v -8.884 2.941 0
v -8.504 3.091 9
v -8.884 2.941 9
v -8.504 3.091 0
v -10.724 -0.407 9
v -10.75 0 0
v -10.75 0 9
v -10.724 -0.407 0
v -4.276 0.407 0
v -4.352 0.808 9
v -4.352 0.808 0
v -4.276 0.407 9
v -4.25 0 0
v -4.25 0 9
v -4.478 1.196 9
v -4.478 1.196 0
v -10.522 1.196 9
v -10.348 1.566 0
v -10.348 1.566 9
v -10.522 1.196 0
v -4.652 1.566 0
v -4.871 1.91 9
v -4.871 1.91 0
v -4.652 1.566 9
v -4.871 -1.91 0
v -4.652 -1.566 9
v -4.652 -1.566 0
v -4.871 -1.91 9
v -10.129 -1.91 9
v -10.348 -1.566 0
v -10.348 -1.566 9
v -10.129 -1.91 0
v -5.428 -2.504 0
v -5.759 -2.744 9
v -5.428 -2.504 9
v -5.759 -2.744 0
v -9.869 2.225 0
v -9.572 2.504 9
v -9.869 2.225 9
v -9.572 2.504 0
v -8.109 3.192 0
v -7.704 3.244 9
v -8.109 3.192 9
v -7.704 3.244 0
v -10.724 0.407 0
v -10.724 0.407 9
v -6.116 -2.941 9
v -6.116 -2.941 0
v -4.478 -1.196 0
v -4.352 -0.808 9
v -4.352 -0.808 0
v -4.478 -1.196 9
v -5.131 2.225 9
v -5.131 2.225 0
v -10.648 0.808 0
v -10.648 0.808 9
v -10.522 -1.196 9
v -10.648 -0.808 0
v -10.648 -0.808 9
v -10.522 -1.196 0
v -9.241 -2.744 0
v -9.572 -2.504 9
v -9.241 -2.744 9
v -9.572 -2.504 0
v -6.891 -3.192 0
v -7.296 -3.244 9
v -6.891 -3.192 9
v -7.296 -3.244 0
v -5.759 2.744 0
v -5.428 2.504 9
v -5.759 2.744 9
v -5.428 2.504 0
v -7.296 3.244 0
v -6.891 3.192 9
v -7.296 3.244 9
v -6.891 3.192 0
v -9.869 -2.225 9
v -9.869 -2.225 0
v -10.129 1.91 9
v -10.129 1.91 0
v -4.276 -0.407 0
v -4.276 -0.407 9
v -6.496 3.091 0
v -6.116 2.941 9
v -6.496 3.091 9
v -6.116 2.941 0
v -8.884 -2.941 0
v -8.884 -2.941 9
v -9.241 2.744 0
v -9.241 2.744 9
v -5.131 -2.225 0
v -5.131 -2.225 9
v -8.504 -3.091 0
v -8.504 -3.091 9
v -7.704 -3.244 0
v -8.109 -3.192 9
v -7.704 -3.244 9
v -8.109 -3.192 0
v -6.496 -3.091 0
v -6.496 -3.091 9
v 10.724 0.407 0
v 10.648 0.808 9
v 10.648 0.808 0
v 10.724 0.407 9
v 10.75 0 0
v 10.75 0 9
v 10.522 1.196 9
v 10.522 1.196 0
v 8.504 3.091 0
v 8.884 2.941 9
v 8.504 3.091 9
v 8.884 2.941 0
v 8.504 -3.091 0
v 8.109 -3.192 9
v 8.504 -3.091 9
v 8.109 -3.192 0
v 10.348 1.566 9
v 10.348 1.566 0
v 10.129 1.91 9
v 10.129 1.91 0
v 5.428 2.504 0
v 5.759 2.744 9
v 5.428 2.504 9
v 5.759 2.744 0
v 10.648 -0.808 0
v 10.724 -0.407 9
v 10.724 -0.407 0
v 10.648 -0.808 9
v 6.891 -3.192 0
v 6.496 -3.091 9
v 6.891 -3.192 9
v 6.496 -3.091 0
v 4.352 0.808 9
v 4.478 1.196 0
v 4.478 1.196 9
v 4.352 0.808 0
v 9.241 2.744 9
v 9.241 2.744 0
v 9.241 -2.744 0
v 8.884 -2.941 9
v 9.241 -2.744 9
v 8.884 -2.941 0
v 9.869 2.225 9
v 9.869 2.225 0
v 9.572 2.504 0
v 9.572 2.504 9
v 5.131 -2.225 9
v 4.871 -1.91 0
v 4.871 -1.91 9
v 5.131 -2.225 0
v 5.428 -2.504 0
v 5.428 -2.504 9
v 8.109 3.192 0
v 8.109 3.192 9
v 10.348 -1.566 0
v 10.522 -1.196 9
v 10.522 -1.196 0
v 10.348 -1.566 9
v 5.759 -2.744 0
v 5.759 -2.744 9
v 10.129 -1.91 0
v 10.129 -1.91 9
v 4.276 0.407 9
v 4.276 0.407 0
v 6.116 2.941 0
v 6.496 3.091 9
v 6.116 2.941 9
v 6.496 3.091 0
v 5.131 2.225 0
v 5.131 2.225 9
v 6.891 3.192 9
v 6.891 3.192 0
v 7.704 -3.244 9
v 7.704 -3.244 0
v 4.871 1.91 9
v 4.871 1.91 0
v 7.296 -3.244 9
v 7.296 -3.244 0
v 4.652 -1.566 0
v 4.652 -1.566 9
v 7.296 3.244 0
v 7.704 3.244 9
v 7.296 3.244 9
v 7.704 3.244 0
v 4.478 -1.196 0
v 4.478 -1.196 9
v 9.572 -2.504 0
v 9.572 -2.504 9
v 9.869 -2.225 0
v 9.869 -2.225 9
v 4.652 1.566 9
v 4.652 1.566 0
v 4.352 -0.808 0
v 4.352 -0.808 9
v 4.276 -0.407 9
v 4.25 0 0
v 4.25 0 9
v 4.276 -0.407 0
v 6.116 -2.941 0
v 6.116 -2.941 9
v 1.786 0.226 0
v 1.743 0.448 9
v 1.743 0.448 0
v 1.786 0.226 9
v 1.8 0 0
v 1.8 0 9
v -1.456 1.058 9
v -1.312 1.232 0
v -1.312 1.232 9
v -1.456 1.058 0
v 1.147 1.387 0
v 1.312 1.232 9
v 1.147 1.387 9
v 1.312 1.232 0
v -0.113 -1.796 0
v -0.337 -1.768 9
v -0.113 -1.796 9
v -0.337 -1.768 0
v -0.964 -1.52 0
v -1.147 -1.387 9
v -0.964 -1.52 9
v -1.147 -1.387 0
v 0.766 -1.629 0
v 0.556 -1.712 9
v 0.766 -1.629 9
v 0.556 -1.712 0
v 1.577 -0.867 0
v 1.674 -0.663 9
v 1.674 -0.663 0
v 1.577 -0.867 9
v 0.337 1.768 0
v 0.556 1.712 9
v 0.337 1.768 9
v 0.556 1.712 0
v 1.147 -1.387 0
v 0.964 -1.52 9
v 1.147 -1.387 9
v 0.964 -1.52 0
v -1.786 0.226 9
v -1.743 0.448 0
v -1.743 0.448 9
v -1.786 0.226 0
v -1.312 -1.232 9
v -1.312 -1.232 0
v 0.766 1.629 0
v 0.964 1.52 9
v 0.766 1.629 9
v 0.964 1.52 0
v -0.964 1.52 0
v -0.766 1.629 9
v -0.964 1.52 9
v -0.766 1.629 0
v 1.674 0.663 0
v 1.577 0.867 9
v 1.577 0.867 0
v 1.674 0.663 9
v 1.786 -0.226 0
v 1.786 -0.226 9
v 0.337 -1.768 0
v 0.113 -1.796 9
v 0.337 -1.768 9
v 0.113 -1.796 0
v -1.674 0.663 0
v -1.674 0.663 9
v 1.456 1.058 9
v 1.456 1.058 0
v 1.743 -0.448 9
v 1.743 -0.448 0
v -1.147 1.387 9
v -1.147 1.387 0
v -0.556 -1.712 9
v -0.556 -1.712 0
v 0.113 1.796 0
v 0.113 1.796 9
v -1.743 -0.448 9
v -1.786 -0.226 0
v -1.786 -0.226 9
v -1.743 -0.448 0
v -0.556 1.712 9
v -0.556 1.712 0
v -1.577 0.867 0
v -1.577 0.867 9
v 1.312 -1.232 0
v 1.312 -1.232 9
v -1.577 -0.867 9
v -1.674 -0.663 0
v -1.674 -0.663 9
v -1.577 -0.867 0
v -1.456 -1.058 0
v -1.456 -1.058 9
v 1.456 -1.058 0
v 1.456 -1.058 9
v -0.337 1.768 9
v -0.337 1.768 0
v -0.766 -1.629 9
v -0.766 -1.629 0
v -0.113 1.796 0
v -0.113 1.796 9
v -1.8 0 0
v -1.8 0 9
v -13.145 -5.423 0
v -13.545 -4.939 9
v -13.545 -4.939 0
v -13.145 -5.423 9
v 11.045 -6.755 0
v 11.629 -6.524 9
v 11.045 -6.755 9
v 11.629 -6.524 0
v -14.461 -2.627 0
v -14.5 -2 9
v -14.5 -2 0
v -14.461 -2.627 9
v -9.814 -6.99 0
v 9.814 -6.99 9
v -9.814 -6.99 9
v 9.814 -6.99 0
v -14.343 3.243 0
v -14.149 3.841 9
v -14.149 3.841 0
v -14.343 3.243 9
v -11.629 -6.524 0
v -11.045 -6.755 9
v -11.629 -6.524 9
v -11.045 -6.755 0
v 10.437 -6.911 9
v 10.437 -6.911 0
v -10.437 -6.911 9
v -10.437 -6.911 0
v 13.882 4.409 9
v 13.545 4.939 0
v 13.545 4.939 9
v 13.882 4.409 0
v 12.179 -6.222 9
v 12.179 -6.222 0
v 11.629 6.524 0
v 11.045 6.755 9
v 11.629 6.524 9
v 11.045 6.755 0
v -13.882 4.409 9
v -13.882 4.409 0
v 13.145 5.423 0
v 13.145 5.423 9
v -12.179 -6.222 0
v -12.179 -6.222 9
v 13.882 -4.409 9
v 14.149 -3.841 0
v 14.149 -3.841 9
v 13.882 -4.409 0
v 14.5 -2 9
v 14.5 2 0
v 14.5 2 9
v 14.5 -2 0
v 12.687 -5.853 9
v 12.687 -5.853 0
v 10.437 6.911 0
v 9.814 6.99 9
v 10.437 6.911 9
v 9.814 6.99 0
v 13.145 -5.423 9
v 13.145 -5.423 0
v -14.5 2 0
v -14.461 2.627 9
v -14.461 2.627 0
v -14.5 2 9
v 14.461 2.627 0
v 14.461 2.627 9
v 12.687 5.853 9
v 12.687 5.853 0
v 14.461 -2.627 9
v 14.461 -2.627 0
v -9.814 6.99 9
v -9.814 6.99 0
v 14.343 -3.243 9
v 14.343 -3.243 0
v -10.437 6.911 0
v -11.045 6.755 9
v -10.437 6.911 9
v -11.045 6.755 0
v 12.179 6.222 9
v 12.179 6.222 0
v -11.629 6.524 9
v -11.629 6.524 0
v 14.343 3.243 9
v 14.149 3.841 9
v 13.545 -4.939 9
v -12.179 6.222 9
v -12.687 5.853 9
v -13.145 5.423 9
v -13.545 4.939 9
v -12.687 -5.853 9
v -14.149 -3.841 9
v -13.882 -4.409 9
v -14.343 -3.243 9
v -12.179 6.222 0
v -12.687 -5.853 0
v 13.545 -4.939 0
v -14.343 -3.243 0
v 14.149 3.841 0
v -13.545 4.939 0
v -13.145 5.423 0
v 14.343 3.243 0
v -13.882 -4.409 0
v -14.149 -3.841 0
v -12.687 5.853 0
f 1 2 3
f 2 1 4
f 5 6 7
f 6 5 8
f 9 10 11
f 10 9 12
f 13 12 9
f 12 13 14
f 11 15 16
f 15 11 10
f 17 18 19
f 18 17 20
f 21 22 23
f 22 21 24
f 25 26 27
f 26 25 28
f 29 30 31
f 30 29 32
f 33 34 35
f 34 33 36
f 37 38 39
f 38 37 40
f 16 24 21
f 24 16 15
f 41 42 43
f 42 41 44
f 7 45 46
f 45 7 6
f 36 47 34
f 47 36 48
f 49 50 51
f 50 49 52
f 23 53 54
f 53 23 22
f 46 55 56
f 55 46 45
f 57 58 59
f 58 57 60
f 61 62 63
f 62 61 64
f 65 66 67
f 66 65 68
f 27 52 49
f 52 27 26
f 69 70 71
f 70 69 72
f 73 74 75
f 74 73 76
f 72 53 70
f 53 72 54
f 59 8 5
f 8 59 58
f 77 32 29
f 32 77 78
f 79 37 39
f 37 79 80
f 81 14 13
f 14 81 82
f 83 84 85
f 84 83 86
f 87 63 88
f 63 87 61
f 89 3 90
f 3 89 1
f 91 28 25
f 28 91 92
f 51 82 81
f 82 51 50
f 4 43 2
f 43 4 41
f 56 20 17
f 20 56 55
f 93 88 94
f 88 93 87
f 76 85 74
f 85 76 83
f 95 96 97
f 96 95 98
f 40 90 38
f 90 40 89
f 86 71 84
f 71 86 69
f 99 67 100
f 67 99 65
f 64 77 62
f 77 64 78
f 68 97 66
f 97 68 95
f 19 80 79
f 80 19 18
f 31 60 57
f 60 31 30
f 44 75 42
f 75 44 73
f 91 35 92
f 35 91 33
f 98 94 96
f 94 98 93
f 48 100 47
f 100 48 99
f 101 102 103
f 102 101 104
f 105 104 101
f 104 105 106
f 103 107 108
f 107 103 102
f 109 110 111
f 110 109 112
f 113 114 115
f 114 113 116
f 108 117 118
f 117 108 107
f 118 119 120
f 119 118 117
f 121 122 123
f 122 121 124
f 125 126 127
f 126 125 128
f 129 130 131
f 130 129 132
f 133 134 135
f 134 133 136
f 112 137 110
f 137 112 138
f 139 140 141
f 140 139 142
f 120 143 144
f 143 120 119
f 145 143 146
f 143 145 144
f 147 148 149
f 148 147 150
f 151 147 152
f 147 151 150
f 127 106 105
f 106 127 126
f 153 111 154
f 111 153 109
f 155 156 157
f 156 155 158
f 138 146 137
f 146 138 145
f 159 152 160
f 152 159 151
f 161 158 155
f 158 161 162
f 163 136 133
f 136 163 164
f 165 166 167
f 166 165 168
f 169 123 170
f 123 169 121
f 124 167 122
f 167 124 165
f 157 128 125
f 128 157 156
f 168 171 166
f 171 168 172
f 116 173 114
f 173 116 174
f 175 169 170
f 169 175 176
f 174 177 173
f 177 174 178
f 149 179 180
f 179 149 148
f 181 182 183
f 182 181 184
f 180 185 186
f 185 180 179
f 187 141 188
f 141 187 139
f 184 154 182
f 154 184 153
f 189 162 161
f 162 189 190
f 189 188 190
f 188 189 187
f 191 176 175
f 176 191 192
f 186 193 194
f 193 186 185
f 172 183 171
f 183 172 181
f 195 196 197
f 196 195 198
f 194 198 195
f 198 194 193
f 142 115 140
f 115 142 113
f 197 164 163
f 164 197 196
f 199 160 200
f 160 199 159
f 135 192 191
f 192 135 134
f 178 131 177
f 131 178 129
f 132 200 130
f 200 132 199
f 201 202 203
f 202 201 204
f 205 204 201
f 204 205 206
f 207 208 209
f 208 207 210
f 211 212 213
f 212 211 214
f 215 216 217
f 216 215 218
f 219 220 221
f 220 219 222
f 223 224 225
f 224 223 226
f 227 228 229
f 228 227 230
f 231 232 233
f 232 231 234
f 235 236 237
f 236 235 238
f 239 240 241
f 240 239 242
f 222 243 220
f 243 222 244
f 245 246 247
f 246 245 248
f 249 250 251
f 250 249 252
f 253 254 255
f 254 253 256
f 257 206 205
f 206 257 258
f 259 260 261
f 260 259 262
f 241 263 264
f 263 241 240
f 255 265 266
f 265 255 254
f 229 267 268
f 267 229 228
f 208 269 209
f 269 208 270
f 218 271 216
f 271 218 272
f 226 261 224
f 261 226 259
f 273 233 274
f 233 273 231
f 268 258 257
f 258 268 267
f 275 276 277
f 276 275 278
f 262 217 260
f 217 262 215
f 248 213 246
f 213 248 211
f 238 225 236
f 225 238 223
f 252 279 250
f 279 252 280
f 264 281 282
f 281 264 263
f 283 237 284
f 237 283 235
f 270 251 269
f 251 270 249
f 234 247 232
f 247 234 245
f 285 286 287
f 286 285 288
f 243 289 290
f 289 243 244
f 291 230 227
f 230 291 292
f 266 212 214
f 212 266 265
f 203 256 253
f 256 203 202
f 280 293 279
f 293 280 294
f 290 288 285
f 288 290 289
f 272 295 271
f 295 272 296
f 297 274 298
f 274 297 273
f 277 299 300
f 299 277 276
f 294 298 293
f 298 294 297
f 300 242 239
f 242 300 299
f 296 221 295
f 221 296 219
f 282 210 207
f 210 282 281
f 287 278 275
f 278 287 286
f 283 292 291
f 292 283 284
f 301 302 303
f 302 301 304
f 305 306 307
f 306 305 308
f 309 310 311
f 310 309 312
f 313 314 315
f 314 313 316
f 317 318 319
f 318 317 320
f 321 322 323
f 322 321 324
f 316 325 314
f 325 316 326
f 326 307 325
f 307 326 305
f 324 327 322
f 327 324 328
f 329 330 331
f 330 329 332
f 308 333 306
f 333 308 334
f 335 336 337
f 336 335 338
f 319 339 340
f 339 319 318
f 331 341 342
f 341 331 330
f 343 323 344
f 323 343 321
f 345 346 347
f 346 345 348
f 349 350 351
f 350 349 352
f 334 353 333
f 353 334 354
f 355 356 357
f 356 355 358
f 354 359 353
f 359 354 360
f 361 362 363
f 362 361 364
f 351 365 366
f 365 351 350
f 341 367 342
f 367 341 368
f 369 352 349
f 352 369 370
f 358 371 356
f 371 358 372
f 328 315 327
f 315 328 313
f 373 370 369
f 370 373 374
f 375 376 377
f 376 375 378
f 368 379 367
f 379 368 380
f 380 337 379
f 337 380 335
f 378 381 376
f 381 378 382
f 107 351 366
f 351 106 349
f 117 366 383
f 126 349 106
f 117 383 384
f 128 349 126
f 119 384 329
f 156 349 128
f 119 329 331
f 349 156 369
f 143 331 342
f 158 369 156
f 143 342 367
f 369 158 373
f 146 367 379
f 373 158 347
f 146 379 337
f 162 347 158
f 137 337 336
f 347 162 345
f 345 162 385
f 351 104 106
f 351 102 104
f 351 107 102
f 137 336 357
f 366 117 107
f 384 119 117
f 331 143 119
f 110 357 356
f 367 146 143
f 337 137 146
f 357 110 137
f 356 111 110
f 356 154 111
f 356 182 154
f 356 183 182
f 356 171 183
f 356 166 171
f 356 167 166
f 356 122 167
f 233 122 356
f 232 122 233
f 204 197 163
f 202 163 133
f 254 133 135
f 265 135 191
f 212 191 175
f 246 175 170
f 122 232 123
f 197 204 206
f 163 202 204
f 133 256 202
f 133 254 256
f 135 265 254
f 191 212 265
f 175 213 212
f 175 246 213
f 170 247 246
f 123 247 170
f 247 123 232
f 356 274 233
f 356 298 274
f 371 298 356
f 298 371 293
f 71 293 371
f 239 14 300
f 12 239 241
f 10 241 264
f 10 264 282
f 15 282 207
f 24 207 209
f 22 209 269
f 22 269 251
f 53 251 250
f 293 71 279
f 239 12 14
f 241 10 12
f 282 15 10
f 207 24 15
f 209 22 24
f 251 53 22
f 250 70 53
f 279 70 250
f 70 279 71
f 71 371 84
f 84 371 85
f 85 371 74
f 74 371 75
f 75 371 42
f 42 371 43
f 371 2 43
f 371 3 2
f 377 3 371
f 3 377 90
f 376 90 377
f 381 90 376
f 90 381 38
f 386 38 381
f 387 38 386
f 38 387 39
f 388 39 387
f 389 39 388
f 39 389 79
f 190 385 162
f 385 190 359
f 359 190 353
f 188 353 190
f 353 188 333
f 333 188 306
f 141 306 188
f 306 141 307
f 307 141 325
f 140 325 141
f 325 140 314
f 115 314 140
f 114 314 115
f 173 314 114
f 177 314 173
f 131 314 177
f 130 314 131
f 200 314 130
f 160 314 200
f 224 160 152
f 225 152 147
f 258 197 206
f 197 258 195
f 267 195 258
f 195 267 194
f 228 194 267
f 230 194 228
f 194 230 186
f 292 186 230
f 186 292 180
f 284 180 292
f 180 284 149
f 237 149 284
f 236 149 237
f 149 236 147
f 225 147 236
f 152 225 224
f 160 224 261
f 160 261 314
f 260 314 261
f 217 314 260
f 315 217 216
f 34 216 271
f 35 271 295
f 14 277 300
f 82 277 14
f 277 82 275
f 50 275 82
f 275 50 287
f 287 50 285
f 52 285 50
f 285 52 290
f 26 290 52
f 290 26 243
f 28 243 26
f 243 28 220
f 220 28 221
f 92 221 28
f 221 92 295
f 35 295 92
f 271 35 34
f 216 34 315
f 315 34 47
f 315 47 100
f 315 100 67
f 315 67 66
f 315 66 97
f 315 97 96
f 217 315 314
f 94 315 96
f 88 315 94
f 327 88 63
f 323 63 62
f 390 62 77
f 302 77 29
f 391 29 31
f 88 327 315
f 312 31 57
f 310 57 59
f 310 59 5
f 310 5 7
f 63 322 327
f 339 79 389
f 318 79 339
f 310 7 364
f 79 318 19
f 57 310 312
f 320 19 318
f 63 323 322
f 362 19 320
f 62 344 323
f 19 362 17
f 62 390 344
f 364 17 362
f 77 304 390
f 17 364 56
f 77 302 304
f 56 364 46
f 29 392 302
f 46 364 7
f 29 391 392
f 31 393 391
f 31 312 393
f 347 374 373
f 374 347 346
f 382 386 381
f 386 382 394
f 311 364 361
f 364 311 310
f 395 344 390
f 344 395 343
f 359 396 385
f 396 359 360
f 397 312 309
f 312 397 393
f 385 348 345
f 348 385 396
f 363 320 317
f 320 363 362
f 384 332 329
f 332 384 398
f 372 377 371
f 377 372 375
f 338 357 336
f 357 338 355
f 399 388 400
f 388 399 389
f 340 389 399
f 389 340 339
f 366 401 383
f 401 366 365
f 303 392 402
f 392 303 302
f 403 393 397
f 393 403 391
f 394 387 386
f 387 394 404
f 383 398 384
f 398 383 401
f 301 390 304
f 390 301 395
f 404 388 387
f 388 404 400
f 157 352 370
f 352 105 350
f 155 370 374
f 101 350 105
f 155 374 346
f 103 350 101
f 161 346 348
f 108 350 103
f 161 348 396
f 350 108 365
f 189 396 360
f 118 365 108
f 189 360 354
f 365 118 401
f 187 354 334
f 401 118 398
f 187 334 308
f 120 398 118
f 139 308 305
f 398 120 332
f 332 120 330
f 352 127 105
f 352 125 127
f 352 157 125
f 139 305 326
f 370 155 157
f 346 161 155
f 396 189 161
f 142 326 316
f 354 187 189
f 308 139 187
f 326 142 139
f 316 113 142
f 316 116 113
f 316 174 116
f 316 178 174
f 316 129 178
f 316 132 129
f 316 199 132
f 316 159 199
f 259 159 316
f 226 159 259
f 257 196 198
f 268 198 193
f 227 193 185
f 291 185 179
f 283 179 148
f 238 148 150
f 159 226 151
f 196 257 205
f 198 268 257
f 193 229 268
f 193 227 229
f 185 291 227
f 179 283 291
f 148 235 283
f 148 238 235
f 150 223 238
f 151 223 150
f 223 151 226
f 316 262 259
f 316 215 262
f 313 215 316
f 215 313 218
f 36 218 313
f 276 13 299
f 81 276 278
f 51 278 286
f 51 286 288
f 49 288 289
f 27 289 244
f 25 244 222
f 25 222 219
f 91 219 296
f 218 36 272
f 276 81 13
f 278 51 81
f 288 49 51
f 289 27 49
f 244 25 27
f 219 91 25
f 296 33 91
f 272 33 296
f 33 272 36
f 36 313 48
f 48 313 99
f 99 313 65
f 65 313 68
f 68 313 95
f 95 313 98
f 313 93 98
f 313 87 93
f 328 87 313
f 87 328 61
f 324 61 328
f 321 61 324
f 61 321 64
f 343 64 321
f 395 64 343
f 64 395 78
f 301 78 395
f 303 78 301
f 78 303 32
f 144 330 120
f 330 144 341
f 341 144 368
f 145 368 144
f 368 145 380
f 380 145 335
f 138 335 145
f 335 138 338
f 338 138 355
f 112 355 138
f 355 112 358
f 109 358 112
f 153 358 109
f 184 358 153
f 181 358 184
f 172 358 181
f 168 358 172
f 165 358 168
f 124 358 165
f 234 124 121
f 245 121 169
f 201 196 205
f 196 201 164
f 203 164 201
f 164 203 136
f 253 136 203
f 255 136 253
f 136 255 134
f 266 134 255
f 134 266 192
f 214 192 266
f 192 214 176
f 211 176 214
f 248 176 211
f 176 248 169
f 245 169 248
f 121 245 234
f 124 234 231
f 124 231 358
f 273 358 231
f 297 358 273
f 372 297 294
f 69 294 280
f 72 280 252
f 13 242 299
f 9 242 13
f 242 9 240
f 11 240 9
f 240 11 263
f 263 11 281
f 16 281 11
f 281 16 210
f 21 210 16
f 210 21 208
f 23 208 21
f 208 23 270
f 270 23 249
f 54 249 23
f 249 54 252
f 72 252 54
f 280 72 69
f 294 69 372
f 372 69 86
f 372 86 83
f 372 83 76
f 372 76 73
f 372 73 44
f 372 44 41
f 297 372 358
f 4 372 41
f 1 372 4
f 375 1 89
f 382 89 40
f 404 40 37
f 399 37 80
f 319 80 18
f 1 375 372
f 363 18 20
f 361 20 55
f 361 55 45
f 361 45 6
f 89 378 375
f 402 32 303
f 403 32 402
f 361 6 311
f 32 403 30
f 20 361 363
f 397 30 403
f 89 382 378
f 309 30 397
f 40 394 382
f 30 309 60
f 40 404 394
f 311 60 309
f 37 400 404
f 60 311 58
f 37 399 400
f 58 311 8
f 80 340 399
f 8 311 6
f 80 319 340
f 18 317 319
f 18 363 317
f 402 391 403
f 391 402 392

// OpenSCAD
$fn = 50;


difference() {
	union() {
		*color(alpha = 1.0000000000, c = "gray") {
			translate(v = [0, 7, 0]) {
				linear_extrude(height = 1) {
					text(font = "Arial:style=Bold", halign = "center", size = 4.5000000000, text = "COMMENT plate main", valign = "center");
				}
			}
		}
		*color(alpha = 1.0000000000, c = "gray") {
			translate(v = [0, 14, 0]) {
				linear_extrude(height = 1) {
					text(font = "Arial:style=Bold", halign = "center", size = 4.5000000000, text = "COMMENT description oobb_plate_shape_p_type_9_depth_2_width_1_height_9_thickness_true_both_holes", valign = "center");
				}
			}
		}
		hull() {
			translate(v = [-9.5000000000, 2.0000000000, 0]) {
				cylinder(h = 9, r = 5);
			}
			translate(v = [9.5000000000, 2.0000000000, 0]) {
				cylinder(h = 9, r = 5);
			}
			translate(v = [-9.5000000000, -2.0000000000, 0]) {
				cylinder(h = 9, r = 5);
			}
			translate(v = [9.5000000000, -2.0000000000, 0]) {
				cylinder(h = 9, r = 5);
			}
		}
	}
	union() {
		*color(alpha = 1.0000000000, c = "gray") {
			translate(v = [0, 7, 0]) {
				linear_extrude(height = 1) {
					text(font = "Arial:style=Bold", halign = "center", size = 4.5000000000, text = "COMMENT holes main", valign = "center");
				}
			}
		}
		*color(alpha = 1.0000000000, c = "gray") {
			translate(v = [0, 14, 0]) {
				linear_extrude(height = 1) {
					text(font = "Arial:style=Bold", halign = "center", size = 4.5000000000, text = "COMMENT description oobb_holes_shape_n_type_2_width_1_height_9_thickness_true_both_holes", valign = "center");
				}
			}
		}
		translate(v = [-7.5000000000, 0.0000000000, 0]) {
			translate(v = [0, 0, -50]) {
				cylinder(h = 100, r = 3.2500000000);
			}
		}
		translate(v = [7.5000000000, 0.0000000000, 0]) {
			translate(v = [0, 0, -50]) {
				cylinder(h = 100, r = 3.2500000000);
			}
		}
		translate(v = [-7.5000000000, 0.0000000000, 0]) {
			translate(v = [0, 0, -50]) {
				cylinder(h = 100, r = 1.8000000000);
			}
		}
		translate(v = [0, 0, -50]) {
			cylinder(h = 100, r = 1.8000000000);
		}
		translate(v = [7.5000000000, 0.0000000000, 0]) {
			translate(v = [0, 0, -50]) {
				cylinder(h = 100, r = 1.8000000000);
			}
		}
	}
}
